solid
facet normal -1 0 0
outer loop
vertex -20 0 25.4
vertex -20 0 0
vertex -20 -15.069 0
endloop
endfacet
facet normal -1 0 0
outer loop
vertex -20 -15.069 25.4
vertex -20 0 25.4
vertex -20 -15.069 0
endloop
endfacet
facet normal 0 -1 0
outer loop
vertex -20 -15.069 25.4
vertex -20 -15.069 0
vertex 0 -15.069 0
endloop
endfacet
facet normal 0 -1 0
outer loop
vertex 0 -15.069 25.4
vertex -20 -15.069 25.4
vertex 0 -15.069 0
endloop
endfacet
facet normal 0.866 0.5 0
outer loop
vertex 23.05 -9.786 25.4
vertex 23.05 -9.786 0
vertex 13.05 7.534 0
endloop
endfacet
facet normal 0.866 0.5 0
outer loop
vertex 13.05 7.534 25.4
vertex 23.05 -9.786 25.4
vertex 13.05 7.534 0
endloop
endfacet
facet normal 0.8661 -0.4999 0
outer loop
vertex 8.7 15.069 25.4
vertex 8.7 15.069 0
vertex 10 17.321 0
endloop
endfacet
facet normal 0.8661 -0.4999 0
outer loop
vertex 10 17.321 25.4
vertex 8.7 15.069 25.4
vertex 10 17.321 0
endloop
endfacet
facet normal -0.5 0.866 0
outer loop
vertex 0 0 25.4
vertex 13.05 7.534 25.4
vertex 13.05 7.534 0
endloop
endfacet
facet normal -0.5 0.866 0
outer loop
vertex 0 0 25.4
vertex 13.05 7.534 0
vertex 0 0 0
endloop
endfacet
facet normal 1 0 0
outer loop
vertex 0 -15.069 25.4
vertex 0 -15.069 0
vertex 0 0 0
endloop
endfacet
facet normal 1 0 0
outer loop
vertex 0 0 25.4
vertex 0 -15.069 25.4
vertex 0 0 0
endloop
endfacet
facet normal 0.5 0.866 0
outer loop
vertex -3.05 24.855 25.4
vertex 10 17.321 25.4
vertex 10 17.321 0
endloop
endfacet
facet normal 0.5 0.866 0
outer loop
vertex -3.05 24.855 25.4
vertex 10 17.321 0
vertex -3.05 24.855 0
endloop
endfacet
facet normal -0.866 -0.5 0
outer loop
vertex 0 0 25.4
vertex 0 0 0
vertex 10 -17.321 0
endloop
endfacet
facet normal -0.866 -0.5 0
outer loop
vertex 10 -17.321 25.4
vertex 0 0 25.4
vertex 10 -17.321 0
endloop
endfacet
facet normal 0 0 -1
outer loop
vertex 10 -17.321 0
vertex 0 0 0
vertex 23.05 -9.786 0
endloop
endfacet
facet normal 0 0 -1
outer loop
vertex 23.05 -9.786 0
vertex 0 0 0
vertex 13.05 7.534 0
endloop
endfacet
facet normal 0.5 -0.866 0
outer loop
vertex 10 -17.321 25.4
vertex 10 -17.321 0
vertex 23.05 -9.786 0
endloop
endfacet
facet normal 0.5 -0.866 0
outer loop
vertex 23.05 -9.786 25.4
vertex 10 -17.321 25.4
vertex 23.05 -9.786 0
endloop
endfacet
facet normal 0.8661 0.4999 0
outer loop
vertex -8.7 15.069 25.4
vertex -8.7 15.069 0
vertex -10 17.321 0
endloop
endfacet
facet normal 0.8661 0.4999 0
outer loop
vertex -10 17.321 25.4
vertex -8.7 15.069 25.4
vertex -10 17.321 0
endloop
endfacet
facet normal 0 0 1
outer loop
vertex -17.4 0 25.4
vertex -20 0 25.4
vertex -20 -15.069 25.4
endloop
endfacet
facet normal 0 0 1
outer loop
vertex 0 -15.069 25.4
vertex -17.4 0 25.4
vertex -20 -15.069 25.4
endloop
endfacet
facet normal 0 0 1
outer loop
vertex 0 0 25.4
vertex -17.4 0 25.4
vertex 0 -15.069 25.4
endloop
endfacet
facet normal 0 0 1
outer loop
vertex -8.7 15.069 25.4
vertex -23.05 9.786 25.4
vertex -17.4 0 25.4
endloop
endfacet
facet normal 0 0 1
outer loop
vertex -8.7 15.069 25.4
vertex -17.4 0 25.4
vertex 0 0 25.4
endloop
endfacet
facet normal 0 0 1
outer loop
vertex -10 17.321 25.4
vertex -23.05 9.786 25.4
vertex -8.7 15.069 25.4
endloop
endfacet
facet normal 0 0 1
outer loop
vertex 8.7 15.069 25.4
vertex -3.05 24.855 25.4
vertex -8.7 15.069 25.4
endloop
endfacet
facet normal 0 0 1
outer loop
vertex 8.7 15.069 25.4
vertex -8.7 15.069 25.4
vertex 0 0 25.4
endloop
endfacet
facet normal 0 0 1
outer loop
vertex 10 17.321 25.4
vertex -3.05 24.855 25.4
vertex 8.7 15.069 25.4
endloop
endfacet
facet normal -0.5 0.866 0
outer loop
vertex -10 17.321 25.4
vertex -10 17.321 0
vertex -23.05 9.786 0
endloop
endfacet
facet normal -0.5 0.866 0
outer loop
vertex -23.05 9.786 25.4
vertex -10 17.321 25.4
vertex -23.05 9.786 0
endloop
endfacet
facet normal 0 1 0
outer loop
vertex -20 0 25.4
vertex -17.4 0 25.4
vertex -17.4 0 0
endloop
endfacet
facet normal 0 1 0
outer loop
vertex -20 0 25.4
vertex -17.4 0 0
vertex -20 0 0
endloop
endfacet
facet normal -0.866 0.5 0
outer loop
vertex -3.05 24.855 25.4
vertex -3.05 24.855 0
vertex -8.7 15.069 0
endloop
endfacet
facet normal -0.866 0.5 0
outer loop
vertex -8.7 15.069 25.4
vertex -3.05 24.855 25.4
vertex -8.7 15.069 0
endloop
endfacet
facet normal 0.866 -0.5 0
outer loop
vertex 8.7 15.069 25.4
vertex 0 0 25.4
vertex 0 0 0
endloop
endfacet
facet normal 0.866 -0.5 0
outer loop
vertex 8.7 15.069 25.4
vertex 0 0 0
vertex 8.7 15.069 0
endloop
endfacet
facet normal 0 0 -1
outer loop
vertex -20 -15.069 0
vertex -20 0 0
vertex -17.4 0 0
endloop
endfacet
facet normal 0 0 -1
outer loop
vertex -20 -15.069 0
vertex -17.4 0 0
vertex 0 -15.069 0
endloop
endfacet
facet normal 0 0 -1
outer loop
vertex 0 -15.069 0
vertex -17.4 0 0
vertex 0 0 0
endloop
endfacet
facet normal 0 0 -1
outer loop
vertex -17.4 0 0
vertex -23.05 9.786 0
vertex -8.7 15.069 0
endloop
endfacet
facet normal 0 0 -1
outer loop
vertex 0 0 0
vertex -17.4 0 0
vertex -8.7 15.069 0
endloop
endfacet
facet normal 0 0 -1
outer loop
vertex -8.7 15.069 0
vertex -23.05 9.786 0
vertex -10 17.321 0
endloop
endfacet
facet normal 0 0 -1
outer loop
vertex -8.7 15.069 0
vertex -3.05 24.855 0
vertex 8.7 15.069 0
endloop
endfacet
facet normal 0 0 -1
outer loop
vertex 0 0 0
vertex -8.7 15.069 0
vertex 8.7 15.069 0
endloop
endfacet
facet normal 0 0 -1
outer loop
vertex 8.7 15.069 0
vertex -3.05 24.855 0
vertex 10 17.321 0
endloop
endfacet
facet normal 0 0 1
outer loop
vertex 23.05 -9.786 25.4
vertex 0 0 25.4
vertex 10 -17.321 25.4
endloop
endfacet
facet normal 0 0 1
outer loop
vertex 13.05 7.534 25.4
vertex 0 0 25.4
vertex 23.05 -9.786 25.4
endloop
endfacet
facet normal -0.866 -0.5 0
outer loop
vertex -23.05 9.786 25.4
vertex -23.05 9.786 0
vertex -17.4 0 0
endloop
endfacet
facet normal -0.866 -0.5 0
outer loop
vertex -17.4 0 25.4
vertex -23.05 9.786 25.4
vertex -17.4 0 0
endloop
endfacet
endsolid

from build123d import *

# Parameters (mm, degrees)
F1_DEPTH = 25.4


with BuildPart() as f1:
    # F0 (on Top) → F1 (new body)
    with BuildSketch(Plane.XY):
        Polygon((0, 0), (0, 15.0686036795), (8.6998623907, 15.0686036795), (10, 17.3205080757), (-3.049793586, 24.8548099155), (-8.6998623907, 15.0686036795), align=None)
        Polygon((8.6998623907, 15.0686036795), (0, 15.0686036795), (0, 0), align=None)
        Polygon((-17.3997247814, 0), (0, 0), (-13.049793586, 7.5343018398), (-8.6998623907, 15.0686036795), (-10, 17.3205080757), (-23.049793586, 9.7862062359), align=None)
        Polygon((-8.6998623907, -15.0686036795), (0, 0), (-13.049793586, -7.5343018398), (-17.3997247814, 0), (-20, 0), (-20, -15.0686036795), align=None)
        Polygon((-13.049793586, 7.5343018398), (0, 0), (-8.6998623907, 15.0686036795), align=None)
        Polygon((-13.049793586, -7.5343018398), (0, 0), (-17.3997247814, 0), align=None)
        Polygon((0, -15.0686036795), (0, 0), (-8.6998623907, -15.0686036795), align=None)
    extrude(amount=F1_DEPTH)


with BuildPart() as f1b:
    # F0 (on Top) → F1, piece 2 (new body)
    with BuildSketch(Plane.XY):
        Polygon((13.049793586, 7.5343018398), (0, 0), (10, -17.3205080757), (23.049793586, -9.7862062359), align=None)
    extrude(amount=F1_DEPTH)


solid = Compound([f1.part, f1b.part])
